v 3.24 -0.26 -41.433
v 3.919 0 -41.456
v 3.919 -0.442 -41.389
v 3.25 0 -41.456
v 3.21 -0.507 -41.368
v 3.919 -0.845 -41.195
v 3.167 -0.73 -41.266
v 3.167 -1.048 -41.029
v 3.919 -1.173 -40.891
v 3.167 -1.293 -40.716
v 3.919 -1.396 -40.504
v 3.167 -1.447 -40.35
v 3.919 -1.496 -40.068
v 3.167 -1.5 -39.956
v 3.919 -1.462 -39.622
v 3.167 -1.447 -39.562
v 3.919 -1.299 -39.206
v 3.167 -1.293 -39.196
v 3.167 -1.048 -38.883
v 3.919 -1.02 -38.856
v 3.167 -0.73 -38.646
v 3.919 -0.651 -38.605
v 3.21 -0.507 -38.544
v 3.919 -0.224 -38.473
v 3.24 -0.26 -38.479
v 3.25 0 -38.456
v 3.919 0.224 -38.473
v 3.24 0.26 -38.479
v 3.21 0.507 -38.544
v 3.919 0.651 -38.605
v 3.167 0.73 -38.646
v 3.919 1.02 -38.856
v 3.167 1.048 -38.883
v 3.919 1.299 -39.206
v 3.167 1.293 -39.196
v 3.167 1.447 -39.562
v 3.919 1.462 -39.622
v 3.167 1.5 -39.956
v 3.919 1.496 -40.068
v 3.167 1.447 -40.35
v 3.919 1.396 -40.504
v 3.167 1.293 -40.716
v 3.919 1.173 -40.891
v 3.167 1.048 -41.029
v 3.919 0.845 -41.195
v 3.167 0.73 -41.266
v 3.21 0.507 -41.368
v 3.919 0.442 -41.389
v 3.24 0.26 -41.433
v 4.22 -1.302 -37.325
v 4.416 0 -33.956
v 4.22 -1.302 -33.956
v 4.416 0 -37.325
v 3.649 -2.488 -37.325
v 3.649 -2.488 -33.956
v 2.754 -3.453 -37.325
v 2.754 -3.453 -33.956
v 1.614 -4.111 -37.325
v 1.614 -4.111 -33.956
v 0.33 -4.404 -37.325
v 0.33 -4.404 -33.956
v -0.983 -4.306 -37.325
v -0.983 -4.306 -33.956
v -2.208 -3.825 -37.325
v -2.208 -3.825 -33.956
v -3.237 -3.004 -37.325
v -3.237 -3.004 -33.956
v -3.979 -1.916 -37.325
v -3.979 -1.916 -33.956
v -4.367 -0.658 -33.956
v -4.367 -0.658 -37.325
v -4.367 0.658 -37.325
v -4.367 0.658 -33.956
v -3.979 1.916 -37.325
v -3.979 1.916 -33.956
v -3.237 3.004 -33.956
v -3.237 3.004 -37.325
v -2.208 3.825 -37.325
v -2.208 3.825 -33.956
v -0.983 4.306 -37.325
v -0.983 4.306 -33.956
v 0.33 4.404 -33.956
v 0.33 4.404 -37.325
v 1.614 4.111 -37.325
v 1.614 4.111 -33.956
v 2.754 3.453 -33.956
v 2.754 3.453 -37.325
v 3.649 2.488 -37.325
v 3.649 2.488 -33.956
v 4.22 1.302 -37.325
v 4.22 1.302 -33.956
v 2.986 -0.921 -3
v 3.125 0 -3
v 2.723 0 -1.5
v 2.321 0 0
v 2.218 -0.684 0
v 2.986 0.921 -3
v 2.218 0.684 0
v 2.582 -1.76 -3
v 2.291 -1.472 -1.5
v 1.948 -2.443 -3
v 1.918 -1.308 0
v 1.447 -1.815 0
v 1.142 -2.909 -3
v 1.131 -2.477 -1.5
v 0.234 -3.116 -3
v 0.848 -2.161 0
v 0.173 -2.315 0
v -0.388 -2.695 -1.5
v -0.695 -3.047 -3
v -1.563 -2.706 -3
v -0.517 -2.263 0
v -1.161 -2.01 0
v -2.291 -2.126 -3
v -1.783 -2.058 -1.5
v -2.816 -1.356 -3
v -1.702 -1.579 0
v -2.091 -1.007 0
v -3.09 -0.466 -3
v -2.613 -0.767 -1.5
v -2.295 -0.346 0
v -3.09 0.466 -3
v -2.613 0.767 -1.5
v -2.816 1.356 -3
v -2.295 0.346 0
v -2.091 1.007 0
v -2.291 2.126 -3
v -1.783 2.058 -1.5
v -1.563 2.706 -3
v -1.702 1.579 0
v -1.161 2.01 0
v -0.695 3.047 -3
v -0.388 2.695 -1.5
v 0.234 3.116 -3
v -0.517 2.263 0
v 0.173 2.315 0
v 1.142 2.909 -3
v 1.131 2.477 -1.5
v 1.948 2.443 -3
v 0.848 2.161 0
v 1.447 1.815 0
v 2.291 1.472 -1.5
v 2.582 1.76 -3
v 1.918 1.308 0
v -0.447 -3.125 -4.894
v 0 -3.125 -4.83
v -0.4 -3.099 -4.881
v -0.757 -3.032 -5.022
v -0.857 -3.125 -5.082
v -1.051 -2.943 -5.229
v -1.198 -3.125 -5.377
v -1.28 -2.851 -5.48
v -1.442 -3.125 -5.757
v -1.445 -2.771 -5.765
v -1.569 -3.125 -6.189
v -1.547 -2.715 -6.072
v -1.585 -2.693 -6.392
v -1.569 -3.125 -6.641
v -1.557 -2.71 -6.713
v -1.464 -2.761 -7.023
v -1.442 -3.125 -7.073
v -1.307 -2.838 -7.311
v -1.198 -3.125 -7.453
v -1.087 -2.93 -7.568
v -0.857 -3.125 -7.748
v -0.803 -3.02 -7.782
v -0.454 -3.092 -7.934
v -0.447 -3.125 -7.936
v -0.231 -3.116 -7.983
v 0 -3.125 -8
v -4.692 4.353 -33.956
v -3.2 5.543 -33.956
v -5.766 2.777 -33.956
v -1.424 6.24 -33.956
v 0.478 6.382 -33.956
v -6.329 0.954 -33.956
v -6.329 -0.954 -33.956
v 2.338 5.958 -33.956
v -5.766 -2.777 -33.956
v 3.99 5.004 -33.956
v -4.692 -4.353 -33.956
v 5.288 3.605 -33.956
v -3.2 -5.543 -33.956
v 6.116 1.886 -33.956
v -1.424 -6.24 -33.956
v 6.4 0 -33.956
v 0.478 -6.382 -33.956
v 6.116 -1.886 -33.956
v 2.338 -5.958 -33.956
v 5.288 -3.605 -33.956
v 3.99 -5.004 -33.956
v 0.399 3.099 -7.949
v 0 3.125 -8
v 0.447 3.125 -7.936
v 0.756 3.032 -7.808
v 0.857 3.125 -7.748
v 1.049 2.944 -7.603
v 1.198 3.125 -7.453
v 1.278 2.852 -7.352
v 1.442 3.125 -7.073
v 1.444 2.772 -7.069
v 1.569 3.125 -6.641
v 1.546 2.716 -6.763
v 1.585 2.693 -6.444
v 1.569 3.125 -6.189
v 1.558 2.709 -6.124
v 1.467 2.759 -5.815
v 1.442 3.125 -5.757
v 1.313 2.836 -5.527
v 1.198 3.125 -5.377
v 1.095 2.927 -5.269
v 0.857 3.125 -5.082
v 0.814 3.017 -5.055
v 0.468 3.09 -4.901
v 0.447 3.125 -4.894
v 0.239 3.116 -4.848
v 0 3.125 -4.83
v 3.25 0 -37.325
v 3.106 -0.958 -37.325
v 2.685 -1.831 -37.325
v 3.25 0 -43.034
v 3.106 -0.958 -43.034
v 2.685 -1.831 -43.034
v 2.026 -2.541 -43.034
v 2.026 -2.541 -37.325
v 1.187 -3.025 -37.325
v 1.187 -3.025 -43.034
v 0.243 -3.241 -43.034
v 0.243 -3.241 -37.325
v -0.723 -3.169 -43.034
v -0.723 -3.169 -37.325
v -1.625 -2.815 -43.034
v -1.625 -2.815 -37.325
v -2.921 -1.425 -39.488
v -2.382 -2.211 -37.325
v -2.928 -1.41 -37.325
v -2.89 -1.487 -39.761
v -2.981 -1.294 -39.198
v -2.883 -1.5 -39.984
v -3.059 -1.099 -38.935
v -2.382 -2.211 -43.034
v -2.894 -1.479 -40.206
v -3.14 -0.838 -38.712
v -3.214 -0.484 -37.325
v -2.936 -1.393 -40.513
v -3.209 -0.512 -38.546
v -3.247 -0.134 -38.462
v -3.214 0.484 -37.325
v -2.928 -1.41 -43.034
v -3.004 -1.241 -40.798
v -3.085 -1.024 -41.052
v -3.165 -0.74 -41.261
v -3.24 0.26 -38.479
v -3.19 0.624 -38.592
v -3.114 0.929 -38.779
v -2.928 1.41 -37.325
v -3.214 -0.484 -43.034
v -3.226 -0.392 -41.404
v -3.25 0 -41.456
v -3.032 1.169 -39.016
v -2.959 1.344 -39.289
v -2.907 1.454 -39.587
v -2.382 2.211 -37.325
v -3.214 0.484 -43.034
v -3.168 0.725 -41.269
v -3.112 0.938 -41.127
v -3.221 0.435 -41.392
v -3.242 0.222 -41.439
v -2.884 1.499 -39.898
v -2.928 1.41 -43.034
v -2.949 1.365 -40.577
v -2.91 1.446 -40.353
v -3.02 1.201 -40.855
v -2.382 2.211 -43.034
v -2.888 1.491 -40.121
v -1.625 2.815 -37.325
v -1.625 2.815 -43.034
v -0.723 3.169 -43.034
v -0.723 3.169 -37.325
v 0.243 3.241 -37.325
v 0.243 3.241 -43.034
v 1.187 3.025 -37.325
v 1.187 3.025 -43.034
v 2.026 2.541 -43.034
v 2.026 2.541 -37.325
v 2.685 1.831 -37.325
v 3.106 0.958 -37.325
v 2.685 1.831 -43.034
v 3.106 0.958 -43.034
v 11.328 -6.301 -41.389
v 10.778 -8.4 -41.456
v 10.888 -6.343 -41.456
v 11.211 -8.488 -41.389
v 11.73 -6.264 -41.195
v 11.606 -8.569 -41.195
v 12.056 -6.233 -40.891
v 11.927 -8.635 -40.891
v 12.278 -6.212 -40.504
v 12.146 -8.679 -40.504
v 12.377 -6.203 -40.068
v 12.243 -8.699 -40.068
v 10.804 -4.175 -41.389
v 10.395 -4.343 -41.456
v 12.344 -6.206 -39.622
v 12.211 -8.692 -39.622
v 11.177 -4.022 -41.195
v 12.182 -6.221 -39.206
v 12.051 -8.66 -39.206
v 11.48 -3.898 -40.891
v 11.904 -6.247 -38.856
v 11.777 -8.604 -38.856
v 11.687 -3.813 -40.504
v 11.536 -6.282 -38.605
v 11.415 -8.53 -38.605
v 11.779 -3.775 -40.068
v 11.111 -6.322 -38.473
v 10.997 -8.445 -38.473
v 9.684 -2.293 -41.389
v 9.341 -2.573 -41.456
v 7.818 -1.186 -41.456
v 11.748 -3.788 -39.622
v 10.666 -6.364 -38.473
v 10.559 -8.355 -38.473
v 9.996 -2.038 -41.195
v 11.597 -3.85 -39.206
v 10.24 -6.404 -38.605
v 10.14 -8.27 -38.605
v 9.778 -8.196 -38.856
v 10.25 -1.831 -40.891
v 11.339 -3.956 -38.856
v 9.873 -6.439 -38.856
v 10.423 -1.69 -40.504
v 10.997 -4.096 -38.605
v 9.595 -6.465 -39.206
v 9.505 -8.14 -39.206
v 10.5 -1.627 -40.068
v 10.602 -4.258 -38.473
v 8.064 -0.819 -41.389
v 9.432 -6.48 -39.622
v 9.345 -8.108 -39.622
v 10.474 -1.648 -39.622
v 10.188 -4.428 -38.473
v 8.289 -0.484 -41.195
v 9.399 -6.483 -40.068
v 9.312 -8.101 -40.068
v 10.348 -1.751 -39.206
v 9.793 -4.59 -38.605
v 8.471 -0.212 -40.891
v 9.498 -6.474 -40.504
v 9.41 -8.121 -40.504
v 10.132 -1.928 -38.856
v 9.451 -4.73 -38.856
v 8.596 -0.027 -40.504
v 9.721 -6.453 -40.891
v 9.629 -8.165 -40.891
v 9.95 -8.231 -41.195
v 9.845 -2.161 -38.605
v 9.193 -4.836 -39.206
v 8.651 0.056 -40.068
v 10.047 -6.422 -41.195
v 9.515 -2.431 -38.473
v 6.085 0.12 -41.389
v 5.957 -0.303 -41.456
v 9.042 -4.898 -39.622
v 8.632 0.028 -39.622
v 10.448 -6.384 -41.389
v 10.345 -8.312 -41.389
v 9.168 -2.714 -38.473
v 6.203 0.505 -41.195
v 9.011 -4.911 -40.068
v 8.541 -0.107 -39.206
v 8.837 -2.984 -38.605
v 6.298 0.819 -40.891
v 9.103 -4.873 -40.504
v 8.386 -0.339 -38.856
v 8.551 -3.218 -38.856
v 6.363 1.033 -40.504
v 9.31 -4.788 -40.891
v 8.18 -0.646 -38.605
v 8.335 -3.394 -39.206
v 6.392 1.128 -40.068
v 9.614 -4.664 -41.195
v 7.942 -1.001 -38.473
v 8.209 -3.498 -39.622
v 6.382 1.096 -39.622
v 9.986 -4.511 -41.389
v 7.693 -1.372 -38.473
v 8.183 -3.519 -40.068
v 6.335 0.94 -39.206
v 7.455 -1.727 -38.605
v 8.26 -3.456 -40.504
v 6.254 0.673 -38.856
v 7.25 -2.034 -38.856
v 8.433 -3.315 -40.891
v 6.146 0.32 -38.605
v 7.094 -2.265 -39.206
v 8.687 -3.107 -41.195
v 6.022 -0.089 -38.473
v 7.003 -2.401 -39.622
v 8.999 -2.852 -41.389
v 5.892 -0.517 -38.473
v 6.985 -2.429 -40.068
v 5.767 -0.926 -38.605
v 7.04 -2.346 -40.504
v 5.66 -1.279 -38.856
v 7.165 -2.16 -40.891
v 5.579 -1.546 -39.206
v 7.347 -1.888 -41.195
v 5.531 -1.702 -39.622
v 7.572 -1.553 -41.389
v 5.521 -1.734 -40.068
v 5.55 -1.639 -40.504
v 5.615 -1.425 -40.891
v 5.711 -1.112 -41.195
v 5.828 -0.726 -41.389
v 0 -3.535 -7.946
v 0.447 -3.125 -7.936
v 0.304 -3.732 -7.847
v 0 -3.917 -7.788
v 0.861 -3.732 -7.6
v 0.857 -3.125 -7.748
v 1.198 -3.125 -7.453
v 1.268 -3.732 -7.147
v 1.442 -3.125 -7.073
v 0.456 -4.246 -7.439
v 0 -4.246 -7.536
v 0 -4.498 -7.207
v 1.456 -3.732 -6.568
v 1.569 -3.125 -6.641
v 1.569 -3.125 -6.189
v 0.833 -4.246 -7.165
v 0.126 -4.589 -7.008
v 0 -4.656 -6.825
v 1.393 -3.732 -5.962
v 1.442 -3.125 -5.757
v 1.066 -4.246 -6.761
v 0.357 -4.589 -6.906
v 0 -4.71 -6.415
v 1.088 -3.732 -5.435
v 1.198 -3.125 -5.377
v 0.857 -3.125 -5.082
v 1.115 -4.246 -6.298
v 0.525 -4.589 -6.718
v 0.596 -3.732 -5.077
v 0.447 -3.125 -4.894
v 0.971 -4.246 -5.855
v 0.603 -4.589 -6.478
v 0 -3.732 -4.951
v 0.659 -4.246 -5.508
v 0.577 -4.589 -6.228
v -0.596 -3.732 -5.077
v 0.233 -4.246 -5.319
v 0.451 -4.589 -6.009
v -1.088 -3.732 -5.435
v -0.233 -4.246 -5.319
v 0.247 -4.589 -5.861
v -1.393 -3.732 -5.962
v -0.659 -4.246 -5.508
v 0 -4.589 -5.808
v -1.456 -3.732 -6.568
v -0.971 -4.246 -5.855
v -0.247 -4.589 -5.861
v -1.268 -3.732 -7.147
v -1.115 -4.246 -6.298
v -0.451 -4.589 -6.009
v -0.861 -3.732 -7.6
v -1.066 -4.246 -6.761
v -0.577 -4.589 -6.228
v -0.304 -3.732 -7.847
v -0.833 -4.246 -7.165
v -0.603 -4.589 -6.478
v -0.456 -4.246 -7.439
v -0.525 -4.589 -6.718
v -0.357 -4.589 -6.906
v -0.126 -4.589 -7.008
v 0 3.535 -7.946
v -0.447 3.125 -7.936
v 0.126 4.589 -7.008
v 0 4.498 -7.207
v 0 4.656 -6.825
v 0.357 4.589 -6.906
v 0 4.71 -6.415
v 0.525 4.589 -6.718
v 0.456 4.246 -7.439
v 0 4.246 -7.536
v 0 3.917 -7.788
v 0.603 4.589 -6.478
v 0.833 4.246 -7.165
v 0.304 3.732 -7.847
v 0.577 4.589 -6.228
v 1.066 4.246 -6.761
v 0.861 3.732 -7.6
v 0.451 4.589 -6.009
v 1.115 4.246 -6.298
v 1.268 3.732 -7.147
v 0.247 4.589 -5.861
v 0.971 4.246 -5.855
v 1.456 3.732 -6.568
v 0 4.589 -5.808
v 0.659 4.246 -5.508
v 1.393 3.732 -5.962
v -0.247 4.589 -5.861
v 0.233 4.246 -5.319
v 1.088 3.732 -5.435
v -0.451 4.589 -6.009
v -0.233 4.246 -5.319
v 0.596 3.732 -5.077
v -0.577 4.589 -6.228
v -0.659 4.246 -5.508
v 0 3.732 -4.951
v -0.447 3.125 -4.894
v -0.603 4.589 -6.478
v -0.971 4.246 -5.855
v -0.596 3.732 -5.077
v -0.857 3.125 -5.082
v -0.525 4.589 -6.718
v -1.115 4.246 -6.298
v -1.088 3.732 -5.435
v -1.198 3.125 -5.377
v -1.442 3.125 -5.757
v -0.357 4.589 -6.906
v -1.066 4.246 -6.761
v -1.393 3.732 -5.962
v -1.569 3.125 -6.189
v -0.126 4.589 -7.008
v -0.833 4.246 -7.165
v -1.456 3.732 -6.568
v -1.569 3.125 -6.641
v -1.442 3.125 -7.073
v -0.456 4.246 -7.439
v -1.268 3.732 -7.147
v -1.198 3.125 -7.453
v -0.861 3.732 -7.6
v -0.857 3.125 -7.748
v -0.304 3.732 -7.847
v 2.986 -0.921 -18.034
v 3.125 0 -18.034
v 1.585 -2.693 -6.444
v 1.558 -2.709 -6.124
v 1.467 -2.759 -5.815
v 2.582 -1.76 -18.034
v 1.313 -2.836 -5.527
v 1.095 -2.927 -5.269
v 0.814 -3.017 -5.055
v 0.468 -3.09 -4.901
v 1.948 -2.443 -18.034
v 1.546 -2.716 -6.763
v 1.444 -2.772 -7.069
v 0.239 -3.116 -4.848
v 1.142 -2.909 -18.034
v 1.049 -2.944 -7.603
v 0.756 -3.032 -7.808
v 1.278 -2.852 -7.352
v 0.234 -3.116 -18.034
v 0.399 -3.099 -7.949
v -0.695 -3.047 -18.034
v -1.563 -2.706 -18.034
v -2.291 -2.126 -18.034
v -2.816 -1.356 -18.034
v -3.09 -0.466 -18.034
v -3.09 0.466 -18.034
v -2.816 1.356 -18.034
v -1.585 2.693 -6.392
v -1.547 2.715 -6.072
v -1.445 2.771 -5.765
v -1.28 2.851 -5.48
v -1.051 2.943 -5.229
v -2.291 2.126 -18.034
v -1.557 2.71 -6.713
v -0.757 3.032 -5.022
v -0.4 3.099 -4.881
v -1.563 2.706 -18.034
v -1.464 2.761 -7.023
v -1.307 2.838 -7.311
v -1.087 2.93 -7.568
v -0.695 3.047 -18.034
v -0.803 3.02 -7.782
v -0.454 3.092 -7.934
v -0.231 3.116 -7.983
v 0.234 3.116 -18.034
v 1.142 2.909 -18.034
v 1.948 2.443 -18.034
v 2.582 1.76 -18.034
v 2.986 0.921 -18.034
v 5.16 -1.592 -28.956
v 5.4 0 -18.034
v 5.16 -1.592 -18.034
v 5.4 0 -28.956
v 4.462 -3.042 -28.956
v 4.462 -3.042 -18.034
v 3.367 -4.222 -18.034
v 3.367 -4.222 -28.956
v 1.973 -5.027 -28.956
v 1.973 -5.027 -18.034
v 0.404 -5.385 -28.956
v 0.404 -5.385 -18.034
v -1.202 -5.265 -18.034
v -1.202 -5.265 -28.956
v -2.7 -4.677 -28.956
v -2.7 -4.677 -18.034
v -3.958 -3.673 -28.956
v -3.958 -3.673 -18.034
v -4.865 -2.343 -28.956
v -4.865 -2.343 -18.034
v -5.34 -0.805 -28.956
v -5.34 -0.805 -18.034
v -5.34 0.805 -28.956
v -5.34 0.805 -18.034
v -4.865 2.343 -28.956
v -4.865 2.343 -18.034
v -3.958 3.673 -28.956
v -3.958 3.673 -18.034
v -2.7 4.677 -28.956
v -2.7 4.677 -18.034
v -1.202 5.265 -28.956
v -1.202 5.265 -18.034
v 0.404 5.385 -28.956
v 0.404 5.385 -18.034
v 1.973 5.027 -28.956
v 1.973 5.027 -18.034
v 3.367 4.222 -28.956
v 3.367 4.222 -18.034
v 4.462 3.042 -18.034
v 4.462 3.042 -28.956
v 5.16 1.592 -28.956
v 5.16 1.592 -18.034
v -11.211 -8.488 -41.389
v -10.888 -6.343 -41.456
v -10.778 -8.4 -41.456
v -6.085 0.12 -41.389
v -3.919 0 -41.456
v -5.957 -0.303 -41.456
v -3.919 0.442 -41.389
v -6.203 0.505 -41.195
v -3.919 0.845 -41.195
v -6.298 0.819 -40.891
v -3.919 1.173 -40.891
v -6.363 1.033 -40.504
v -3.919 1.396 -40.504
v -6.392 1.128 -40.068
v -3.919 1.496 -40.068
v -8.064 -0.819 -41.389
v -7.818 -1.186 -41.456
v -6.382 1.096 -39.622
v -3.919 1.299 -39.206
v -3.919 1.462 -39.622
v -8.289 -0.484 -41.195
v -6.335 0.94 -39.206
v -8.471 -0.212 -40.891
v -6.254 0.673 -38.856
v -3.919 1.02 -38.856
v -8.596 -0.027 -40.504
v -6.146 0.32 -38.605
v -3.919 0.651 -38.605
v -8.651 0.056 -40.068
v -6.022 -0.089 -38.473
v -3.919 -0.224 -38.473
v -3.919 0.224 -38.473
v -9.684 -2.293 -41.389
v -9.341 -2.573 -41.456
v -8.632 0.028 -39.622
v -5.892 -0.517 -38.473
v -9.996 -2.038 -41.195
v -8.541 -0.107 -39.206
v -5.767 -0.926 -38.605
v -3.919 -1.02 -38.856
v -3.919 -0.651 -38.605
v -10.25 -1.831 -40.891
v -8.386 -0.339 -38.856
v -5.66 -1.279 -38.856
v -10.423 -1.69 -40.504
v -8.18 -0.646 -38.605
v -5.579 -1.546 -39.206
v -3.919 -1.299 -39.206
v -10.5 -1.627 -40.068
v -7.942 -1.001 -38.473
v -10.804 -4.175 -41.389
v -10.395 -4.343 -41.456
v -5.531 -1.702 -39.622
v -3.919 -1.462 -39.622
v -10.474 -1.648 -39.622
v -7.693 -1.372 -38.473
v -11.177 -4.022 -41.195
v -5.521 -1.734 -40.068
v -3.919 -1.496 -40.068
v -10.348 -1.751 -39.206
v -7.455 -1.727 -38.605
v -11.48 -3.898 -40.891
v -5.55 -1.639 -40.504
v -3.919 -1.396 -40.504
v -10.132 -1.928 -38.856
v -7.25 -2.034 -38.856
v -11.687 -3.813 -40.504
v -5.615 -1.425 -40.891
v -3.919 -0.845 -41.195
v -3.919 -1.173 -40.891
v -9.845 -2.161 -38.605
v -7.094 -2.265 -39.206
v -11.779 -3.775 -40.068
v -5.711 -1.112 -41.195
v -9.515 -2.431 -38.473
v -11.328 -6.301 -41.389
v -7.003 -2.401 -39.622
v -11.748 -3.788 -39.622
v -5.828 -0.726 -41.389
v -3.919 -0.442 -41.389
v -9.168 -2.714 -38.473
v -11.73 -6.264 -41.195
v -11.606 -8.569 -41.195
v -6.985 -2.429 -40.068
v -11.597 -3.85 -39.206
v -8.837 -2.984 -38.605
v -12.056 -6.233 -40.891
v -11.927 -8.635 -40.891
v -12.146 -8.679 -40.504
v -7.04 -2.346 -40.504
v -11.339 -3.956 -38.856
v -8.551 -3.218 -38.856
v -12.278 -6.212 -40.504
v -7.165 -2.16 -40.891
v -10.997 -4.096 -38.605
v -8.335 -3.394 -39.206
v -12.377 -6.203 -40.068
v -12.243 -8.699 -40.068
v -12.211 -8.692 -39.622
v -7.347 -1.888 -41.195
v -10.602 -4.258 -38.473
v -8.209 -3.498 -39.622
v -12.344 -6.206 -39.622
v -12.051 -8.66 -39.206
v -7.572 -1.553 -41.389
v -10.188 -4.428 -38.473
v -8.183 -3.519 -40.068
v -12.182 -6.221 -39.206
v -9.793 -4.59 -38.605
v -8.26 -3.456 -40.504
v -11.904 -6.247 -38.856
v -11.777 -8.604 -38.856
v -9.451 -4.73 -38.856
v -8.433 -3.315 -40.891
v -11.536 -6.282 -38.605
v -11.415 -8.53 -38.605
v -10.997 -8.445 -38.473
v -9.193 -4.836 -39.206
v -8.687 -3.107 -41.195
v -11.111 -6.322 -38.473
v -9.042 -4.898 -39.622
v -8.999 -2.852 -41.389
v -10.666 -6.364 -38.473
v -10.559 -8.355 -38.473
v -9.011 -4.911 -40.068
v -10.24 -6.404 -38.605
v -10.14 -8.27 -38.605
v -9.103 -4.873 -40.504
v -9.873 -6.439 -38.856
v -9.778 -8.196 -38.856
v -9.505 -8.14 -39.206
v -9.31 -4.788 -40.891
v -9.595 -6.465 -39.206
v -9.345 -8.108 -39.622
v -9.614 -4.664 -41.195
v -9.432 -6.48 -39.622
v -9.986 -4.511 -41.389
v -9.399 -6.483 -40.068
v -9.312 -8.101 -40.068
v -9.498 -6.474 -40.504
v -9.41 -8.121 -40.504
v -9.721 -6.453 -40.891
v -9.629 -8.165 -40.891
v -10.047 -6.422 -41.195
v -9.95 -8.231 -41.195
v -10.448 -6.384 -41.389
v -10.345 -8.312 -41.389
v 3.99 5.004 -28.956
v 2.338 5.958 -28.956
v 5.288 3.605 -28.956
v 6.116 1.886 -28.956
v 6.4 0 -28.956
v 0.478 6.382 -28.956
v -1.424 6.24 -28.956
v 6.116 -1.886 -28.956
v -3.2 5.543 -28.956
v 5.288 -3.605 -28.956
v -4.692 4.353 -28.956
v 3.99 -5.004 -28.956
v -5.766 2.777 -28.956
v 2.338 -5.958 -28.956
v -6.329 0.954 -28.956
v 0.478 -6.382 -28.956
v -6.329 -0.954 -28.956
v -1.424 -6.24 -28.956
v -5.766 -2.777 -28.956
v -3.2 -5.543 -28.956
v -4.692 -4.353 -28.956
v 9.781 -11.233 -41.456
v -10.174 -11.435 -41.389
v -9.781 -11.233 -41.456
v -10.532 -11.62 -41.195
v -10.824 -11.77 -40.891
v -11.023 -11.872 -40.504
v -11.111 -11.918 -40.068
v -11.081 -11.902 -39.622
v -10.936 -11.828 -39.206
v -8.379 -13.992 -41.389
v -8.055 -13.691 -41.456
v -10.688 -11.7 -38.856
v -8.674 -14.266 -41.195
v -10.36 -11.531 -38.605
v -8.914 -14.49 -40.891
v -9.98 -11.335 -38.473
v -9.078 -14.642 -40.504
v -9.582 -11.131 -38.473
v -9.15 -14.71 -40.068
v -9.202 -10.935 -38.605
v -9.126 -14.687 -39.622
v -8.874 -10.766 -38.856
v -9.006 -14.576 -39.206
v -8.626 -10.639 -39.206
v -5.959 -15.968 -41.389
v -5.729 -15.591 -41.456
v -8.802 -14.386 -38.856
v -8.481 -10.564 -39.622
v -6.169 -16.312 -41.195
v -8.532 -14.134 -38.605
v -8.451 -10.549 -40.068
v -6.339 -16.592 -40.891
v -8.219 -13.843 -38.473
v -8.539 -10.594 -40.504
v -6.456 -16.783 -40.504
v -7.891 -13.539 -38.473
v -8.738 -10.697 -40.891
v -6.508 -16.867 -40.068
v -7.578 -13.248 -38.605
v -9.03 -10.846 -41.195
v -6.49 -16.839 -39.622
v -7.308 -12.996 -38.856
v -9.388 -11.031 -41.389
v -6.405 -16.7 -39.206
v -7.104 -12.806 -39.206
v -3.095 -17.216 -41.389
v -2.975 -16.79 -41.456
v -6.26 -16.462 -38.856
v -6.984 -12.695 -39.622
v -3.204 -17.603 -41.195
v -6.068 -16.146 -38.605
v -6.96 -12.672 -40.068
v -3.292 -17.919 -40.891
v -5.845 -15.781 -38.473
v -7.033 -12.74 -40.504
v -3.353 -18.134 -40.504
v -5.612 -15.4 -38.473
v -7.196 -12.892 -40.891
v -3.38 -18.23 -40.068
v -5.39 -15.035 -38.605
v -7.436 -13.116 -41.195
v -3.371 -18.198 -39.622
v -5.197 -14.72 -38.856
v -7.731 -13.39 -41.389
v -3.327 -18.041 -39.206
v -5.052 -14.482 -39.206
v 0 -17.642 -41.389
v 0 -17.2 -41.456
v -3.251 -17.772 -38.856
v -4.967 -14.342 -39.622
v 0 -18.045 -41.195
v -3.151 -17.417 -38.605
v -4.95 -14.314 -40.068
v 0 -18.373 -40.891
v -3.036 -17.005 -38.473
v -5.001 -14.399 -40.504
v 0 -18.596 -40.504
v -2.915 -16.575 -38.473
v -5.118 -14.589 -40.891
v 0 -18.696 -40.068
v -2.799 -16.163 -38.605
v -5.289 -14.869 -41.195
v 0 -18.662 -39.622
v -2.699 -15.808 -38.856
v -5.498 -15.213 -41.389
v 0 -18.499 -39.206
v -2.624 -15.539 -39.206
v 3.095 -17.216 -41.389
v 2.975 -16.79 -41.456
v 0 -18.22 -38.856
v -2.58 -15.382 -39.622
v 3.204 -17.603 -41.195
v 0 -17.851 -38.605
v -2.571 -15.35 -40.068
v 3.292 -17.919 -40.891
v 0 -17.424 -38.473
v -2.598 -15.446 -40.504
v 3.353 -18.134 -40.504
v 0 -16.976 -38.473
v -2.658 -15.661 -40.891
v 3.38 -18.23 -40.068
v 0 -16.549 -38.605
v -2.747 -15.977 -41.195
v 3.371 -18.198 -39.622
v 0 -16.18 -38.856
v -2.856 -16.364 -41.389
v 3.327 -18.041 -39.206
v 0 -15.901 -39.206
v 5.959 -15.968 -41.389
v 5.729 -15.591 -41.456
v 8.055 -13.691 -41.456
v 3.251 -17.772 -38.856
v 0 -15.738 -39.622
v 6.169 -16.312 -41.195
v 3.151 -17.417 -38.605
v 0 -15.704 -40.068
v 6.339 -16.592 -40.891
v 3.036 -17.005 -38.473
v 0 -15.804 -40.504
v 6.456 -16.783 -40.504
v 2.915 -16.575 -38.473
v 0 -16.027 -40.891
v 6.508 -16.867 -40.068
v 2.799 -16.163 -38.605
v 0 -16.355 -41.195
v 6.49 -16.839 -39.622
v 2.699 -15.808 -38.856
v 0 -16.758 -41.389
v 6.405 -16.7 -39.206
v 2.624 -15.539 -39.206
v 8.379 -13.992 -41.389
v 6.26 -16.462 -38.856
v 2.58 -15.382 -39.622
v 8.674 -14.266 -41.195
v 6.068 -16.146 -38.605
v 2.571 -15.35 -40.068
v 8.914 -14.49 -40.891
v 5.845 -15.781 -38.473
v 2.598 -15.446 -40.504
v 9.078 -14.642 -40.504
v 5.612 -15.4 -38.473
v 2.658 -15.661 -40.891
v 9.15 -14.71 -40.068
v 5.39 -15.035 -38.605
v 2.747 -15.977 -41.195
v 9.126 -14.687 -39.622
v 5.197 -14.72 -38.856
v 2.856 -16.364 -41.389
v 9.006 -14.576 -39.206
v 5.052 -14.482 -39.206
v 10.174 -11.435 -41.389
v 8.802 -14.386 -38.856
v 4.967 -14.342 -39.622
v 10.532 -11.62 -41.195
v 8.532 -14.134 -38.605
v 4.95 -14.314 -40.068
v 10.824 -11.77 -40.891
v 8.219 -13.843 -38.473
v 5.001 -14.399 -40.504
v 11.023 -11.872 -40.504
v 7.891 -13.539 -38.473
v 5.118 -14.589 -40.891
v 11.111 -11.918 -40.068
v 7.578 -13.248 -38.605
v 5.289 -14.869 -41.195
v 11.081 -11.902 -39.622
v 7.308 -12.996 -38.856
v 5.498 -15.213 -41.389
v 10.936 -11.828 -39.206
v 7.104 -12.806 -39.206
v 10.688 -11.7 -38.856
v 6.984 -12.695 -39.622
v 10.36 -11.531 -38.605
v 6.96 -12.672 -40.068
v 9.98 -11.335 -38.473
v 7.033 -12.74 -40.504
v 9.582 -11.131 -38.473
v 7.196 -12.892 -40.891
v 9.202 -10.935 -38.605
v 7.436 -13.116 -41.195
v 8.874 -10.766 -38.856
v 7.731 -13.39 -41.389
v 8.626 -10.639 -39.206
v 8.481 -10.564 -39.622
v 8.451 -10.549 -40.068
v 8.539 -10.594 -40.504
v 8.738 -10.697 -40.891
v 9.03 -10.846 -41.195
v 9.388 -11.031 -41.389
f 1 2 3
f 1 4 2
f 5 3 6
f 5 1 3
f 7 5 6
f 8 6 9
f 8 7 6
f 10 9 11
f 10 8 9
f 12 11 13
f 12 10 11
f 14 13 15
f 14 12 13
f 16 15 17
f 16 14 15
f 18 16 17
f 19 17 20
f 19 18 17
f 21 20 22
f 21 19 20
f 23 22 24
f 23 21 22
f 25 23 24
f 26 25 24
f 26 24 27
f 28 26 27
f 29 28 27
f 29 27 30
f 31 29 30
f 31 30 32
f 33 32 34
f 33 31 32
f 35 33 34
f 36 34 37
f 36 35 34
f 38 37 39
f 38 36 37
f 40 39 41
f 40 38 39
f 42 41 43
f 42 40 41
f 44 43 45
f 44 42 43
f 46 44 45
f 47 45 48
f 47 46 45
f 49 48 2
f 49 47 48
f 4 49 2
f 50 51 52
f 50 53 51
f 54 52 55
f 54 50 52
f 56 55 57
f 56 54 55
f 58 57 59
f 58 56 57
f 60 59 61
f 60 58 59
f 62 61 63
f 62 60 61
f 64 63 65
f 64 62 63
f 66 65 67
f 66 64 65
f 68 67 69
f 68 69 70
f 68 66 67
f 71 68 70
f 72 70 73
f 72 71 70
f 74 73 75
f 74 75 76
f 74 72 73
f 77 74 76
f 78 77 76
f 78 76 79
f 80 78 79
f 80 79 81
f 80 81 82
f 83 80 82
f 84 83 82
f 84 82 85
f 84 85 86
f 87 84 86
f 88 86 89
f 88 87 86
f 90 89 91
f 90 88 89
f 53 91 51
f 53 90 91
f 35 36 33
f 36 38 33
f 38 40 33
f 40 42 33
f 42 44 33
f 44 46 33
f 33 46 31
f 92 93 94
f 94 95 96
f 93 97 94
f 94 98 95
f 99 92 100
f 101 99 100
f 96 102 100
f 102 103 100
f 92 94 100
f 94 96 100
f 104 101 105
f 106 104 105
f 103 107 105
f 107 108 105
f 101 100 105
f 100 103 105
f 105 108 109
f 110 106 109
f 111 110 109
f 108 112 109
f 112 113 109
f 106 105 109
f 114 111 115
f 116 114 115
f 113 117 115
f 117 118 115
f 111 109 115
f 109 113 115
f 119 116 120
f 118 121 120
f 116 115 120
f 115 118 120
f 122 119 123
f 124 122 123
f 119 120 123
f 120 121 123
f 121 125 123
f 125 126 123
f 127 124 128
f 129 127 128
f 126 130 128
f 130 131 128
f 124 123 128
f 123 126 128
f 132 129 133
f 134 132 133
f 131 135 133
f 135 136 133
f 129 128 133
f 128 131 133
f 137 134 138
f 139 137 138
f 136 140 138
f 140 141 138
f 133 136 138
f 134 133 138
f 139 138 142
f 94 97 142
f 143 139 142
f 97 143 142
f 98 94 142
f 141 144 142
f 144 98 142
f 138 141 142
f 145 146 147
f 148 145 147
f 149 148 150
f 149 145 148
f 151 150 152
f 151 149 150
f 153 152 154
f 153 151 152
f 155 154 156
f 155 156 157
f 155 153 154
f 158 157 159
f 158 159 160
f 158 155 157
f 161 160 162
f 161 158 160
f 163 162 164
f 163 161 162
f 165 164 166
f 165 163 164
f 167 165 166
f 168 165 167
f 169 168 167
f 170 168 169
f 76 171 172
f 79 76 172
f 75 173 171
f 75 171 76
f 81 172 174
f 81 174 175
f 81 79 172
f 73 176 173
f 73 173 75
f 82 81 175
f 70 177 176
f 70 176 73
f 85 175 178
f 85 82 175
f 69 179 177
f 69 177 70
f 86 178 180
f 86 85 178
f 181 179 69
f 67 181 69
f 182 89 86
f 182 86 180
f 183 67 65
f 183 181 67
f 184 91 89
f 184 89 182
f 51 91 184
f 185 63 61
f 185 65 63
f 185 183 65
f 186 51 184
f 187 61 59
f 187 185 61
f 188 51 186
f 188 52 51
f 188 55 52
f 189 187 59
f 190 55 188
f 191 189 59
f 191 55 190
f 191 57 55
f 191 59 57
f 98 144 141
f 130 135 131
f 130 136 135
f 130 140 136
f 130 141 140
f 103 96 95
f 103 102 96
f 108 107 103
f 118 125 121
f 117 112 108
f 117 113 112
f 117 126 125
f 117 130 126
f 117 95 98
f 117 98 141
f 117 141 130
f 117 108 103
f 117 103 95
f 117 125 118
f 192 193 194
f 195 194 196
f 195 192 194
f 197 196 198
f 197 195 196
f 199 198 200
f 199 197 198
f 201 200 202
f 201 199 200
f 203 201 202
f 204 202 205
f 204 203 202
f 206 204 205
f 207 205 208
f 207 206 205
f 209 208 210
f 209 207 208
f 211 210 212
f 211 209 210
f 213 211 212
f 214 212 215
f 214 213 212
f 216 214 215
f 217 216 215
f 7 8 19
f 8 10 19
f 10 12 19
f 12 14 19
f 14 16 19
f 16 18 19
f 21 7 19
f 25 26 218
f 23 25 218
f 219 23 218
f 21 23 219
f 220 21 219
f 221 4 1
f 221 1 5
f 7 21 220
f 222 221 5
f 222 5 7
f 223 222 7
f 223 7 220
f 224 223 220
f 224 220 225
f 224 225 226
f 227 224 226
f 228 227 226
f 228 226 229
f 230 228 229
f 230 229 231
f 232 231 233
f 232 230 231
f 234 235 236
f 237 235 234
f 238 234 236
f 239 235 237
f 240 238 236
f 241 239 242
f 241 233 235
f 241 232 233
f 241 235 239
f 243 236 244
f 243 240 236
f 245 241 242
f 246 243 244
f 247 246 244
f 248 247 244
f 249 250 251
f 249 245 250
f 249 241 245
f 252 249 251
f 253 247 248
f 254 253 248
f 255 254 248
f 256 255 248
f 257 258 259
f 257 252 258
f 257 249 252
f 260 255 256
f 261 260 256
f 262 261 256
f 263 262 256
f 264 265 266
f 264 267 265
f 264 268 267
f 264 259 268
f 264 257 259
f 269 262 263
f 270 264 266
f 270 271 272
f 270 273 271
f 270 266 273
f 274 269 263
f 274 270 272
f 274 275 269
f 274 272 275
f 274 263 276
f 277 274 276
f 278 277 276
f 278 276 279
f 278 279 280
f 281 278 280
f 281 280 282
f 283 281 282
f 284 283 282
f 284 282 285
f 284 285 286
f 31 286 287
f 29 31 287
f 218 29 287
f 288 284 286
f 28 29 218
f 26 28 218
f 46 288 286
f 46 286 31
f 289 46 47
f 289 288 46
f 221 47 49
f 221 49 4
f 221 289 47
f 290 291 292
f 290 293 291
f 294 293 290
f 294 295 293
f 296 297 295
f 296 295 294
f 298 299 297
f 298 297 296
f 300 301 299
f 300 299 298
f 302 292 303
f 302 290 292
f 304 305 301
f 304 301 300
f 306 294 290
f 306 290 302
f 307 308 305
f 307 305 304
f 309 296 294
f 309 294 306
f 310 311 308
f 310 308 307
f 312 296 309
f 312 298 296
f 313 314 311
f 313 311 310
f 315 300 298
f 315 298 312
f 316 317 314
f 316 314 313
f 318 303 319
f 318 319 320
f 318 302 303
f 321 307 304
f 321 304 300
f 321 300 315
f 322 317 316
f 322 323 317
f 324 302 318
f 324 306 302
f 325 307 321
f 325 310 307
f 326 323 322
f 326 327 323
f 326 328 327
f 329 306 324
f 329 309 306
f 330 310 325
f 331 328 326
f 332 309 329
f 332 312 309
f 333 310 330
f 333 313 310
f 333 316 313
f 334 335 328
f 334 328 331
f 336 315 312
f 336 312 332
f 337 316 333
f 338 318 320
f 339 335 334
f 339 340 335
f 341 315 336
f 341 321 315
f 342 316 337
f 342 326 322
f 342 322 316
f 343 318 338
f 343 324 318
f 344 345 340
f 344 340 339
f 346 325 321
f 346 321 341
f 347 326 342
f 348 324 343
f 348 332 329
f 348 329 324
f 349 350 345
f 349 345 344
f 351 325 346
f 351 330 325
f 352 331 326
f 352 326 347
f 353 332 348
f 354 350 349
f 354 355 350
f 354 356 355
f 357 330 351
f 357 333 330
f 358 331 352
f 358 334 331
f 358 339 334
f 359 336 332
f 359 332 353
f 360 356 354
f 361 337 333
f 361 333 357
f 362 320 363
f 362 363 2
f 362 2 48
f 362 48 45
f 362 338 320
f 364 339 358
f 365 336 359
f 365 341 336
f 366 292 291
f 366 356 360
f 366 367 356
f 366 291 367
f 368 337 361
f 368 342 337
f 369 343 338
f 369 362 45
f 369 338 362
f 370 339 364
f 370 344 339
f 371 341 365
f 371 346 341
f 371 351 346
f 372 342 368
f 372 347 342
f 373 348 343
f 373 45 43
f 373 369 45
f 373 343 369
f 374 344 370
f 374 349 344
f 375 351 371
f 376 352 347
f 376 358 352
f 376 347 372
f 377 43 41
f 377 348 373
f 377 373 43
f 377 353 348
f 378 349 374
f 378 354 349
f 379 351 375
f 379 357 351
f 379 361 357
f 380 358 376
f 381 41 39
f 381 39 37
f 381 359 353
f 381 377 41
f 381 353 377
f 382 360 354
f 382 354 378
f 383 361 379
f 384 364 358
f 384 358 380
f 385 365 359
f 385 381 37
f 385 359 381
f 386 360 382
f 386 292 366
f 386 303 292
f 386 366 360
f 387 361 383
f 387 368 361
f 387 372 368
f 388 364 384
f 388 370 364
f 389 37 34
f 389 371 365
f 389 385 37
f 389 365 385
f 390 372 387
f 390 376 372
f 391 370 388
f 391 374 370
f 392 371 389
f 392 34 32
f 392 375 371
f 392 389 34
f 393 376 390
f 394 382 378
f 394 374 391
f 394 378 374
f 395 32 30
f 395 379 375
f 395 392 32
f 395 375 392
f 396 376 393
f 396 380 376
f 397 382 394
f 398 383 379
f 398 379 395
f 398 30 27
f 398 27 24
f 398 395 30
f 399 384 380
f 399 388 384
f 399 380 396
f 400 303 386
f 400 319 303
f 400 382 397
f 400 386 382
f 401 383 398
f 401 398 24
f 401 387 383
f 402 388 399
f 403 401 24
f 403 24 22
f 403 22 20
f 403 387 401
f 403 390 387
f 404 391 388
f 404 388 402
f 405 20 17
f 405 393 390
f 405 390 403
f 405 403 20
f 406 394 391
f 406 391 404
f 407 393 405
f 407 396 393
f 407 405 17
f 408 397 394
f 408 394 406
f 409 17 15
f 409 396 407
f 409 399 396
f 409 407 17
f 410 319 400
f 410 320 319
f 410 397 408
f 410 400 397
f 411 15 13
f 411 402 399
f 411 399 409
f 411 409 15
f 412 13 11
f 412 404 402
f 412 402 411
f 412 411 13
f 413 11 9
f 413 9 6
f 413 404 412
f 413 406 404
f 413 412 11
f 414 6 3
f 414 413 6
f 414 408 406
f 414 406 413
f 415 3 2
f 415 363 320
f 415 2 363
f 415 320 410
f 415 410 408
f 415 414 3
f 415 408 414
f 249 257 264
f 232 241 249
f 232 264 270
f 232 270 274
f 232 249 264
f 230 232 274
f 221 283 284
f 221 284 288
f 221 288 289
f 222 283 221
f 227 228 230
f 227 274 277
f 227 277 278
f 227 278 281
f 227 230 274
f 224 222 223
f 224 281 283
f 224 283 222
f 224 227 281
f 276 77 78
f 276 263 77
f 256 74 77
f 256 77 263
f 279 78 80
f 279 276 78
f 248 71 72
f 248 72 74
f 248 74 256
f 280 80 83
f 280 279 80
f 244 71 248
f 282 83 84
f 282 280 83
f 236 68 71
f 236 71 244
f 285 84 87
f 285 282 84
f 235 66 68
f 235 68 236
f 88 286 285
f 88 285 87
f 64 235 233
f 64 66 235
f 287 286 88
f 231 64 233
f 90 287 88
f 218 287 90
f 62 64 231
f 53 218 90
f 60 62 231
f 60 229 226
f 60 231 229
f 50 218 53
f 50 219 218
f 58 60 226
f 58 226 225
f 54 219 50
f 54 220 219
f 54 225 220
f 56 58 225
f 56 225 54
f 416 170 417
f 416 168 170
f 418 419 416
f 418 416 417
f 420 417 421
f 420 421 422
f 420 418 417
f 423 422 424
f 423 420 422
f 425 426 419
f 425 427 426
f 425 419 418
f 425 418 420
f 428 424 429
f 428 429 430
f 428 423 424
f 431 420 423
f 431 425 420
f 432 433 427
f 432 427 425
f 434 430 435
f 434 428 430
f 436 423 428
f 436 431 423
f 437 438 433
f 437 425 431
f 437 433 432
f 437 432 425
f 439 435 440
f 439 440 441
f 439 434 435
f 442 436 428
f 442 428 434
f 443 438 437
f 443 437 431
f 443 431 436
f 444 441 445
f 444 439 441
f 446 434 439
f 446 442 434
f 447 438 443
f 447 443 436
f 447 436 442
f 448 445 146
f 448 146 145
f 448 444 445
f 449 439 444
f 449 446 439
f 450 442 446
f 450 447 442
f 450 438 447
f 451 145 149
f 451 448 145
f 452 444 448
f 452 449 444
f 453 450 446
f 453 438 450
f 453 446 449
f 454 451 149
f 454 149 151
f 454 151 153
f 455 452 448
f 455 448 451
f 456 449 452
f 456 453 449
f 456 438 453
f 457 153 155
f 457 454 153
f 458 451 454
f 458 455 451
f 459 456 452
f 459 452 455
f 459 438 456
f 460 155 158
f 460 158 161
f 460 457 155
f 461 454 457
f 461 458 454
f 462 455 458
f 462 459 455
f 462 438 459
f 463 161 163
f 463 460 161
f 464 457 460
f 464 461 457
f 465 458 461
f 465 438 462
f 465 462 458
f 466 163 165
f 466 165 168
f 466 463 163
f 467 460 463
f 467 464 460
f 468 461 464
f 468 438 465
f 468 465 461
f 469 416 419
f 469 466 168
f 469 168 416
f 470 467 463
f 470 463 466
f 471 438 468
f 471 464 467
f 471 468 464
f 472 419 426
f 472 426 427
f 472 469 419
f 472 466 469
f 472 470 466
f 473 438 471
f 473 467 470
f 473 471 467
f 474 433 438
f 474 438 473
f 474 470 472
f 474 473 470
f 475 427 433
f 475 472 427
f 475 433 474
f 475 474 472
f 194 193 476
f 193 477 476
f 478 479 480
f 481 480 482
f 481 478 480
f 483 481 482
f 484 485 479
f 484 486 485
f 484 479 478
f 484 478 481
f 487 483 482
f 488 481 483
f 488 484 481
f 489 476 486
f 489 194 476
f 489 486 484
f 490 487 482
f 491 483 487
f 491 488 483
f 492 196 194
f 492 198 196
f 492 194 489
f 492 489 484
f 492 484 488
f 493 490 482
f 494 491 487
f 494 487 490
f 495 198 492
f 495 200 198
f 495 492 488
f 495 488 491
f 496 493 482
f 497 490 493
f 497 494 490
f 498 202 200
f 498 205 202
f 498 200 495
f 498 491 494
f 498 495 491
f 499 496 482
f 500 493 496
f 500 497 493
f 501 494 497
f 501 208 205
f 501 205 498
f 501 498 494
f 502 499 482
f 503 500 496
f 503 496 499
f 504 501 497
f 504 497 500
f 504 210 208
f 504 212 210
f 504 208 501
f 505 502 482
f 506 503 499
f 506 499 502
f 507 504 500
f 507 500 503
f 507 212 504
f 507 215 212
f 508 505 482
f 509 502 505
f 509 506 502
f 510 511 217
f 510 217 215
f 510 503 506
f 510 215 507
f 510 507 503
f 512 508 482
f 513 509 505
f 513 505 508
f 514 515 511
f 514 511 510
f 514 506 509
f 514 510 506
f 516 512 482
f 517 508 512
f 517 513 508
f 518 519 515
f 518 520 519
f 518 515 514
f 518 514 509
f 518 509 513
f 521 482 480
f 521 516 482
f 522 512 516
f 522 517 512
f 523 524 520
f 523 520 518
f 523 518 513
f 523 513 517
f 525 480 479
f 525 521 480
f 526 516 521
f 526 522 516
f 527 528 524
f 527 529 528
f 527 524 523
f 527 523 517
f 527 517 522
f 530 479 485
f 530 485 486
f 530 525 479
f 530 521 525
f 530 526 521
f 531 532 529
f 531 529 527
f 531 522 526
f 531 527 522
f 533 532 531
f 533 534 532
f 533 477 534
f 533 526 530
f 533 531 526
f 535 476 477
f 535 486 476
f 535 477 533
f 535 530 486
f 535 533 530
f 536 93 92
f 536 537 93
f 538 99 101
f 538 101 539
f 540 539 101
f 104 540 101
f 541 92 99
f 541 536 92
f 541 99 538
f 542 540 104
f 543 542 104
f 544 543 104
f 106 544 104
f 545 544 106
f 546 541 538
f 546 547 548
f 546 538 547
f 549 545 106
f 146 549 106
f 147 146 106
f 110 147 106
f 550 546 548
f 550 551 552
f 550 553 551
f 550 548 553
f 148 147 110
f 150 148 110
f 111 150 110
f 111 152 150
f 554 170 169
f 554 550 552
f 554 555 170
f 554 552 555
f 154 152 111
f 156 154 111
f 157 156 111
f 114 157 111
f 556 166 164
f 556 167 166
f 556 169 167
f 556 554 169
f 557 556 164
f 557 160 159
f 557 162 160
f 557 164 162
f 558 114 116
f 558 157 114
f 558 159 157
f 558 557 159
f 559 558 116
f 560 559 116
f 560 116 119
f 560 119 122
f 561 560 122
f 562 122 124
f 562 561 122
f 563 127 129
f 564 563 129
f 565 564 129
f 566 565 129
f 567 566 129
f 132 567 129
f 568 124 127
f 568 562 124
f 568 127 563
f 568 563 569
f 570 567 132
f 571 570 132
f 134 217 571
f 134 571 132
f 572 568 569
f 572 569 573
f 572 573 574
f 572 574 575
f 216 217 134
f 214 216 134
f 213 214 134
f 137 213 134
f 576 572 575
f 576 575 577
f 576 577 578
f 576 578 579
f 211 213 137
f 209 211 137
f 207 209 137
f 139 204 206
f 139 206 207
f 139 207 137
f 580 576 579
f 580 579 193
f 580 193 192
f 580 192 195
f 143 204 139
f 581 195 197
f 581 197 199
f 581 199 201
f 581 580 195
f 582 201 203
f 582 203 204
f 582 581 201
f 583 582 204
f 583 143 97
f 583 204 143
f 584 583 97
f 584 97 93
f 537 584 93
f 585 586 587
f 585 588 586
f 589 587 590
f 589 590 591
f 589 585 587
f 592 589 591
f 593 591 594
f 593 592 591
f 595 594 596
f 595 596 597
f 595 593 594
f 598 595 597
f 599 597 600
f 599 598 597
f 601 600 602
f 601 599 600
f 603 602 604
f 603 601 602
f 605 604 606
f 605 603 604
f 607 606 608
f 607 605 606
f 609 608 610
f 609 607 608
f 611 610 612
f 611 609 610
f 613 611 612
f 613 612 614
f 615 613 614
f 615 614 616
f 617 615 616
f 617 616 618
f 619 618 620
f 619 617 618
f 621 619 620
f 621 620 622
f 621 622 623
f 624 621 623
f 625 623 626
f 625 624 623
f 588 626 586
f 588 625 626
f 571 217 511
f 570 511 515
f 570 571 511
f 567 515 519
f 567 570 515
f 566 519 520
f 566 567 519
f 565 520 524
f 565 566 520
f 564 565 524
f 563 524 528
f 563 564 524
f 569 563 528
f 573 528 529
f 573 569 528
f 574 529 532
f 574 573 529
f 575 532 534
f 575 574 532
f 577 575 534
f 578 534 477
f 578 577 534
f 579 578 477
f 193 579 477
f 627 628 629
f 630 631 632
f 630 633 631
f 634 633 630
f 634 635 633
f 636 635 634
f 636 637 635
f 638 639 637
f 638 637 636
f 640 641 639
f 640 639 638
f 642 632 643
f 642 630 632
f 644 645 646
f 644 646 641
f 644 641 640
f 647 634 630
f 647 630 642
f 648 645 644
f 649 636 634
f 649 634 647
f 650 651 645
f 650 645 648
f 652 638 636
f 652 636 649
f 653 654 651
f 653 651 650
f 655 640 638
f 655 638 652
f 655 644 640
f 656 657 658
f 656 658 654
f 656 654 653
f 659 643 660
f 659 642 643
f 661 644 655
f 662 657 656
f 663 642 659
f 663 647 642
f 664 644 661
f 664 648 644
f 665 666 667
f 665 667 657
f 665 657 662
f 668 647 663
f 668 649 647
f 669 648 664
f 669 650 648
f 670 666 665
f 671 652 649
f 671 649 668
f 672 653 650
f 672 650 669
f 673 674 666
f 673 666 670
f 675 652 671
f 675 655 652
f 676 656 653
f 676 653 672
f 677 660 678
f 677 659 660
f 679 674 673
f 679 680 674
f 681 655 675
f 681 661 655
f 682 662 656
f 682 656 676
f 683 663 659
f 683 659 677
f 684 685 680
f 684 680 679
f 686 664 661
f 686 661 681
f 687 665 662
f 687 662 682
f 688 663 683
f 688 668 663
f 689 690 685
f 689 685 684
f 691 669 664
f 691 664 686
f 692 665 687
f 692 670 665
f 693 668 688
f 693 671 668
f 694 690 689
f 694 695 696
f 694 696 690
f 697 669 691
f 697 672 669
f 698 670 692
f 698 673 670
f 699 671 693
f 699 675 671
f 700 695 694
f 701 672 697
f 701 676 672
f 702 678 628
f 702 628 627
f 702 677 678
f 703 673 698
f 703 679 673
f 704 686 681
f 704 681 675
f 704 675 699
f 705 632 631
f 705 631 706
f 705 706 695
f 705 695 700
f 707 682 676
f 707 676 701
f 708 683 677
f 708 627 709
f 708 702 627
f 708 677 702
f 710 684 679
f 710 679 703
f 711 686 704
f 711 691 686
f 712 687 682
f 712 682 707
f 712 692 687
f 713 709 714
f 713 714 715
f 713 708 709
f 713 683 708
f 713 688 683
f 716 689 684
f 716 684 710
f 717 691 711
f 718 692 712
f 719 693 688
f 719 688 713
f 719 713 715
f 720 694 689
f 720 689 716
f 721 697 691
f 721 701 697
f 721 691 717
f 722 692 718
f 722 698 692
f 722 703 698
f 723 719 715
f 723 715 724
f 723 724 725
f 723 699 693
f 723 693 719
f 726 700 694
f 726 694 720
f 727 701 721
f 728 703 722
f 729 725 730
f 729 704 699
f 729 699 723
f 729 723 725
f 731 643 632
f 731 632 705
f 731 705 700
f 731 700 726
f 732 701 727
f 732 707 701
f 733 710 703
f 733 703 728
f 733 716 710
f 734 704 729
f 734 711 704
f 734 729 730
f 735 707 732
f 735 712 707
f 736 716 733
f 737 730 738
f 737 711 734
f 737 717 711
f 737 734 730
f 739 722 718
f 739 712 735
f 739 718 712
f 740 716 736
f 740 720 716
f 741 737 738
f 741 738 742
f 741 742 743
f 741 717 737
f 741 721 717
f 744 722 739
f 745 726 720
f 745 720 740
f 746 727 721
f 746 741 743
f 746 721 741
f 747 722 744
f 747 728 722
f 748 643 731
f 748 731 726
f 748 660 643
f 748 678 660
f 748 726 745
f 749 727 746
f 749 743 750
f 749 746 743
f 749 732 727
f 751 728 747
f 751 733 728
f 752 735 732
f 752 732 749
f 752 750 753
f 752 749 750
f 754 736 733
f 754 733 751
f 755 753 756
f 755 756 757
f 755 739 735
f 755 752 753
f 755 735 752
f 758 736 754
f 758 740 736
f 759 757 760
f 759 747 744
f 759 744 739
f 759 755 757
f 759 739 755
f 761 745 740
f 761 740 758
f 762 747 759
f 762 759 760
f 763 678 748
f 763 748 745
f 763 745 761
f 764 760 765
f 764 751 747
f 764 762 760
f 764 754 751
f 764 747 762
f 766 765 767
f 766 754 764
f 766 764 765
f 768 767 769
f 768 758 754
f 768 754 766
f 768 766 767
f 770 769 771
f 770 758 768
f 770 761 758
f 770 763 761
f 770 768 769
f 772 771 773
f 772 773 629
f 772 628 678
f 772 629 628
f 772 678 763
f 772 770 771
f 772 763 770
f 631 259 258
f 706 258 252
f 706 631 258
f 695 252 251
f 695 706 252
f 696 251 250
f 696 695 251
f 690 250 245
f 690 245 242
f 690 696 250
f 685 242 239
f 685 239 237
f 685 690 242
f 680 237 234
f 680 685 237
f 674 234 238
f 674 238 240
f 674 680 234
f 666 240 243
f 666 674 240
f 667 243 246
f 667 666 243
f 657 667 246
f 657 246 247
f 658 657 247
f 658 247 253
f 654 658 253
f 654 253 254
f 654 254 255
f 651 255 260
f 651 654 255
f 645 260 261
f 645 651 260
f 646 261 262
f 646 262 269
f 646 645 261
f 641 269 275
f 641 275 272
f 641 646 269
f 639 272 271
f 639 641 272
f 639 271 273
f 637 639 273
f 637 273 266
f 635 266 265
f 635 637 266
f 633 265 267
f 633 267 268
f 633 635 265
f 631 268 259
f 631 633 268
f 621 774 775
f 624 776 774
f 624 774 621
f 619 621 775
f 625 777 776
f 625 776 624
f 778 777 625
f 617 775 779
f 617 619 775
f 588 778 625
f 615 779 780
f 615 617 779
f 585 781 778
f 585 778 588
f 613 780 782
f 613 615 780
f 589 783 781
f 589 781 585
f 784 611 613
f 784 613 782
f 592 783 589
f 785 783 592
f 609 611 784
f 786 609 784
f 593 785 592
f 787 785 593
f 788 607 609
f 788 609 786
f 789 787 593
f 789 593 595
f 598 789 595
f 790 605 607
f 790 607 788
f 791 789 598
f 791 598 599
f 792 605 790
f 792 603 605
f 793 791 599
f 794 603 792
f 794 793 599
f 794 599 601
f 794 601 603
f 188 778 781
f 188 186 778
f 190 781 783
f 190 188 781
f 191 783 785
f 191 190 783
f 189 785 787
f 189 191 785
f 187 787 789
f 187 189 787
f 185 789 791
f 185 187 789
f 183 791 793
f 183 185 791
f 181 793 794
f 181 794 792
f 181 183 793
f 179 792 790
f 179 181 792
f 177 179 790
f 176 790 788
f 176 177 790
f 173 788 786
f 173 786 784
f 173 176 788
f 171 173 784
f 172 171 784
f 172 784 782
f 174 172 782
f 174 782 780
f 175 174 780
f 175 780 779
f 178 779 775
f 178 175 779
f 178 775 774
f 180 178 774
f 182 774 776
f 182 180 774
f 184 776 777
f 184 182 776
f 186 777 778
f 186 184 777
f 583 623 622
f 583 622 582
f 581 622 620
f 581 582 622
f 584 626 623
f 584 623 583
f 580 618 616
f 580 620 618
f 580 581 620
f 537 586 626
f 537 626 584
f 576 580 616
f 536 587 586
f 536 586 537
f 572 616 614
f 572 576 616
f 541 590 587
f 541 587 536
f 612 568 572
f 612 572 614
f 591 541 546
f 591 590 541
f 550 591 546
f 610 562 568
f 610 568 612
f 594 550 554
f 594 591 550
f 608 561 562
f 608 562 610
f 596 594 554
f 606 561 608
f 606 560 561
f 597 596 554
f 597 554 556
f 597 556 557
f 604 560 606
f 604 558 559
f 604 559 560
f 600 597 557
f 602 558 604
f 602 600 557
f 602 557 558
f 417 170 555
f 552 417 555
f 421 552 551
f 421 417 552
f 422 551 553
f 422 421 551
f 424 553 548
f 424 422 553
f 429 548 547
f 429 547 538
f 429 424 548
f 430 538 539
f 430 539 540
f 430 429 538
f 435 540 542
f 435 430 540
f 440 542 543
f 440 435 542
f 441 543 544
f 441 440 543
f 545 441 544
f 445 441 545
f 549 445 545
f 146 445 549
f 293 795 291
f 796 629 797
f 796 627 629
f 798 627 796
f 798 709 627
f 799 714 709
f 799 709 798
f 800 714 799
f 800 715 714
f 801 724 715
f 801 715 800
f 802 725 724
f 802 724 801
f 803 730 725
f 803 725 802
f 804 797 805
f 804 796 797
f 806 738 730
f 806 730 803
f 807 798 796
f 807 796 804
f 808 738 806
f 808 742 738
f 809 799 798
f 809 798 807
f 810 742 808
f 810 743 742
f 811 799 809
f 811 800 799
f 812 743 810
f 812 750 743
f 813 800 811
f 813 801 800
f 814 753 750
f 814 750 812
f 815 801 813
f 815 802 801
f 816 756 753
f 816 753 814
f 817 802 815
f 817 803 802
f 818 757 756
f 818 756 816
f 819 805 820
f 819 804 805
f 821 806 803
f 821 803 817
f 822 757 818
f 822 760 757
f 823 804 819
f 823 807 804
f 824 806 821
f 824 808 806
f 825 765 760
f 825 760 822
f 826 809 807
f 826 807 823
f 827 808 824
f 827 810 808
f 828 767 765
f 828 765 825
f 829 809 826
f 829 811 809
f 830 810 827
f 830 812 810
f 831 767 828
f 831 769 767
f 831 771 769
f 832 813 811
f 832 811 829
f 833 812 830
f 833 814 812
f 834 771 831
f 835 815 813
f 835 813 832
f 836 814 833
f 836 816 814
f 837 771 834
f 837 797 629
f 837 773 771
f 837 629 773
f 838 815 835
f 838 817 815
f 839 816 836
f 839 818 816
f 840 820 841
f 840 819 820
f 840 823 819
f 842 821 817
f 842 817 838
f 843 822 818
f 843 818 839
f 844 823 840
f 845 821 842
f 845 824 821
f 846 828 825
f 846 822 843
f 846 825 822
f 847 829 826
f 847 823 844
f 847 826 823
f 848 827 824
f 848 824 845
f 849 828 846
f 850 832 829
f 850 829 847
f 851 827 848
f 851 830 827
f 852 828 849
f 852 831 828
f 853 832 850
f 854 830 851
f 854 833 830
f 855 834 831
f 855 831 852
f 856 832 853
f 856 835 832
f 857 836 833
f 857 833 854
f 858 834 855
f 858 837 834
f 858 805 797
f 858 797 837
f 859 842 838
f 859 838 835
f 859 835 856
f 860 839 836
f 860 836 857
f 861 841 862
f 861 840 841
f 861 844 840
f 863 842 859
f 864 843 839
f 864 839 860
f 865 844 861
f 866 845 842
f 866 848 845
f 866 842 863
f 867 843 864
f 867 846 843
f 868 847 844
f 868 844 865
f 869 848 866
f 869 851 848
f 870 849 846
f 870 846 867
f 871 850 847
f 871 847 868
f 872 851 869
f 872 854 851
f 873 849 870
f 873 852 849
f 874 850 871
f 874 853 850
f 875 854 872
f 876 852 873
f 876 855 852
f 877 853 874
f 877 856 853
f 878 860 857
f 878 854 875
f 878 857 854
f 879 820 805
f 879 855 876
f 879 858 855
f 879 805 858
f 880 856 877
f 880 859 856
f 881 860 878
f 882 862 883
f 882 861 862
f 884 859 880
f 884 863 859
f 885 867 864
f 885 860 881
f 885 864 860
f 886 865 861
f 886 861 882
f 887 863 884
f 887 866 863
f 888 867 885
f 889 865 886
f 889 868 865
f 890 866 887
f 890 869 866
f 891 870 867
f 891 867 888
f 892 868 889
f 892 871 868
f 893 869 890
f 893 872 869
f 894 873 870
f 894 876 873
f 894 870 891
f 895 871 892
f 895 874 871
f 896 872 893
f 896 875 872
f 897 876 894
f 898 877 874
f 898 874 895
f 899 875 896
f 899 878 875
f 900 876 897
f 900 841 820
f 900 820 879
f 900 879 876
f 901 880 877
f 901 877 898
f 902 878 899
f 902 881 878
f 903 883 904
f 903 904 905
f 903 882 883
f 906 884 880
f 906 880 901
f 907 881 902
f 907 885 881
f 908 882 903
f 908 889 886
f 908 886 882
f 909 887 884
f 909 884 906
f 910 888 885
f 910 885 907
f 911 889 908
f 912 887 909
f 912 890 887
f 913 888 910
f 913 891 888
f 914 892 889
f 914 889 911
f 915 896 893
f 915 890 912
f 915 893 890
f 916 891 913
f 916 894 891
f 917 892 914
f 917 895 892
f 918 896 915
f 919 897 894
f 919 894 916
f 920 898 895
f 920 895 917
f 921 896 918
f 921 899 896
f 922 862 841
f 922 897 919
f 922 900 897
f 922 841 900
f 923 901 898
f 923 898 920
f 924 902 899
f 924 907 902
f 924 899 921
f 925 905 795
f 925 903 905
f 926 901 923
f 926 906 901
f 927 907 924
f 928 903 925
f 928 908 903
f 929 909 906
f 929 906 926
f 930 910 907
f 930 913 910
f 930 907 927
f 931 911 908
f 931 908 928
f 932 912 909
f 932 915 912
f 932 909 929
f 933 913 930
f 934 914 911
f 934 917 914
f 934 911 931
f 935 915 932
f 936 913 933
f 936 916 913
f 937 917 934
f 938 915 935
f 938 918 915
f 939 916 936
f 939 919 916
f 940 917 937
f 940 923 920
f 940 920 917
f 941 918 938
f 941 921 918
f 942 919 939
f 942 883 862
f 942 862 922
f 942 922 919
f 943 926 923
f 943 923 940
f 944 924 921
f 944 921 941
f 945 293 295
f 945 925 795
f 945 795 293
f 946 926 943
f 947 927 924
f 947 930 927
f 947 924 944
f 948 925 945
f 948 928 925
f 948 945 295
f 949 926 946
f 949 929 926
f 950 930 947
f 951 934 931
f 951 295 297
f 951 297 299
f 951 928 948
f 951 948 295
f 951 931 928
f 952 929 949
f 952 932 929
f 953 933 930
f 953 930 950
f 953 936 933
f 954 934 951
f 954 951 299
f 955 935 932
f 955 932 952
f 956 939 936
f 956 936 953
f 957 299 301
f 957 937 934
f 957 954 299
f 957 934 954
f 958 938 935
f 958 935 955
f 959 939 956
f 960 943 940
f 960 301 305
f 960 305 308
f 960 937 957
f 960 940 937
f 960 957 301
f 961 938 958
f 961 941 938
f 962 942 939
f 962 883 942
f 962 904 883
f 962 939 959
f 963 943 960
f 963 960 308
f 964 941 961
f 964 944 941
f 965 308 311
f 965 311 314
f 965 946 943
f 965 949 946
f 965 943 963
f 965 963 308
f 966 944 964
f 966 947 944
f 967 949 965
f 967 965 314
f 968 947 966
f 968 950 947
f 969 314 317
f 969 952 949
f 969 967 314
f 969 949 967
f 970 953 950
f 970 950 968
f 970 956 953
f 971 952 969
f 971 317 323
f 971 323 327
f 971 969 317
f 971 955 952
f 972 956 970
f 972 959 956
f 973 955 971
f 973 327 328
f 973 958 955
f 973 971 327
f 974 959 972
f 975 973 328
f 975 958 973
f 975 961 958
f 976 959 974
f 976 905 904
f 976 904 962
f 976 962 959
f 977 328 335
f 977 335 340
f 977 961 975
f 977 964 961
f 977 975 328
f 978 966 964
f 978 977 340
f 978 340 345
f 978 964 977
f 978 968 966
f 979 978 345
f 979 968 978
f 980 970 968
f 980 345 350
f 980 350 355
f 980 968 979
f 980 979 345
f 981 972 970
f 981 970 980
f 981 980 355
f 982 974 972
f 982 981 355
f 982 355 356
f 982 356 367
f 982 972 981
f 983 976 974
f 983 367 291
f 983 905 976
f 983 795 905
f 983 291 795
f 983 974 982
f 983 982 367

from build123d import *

# Parameters (mm, degrees)
CHAMFER1_SIZE  = 3
CHAMFER1_SIZE2 = 0.803847577
SKETCH4_R      = 1.5


with BuildPart() as part:
    # Sketch1 → Revolve1 (revolve)
    with BuildSketch(Plane(origin=(0, 0, 0), x_dir=(0, 0, -1), z_dir=(1, 0, 0)), mode=Mode.PRIVATE) as revolve1_sk:
        Polygon((0, 0), (0, 3.125), (18.034, 3.125), (18.034, 5.4), (28.956, 5.4), (28.956, 6.4), (33.956, 6.4), (33.956, 4.416438242), (37.324805723, 4.416438242), (37.324805723, 3.25), (43.034, 3.25), (43.034, 0), align=None)
    revolve(revolve1_sk.sketch.rotate(Axis((0, 0, 6.254285714), (0, 0, -1)), 90), axis=Axis((0, 0, 6.254285714), (0, 0, -1)))

    # Chamfer1
    chamfer1_edges = [part.edges().sort_by_distance(p)[0] for p in [
        (-3.125, 0, 0),
    ]]
    chamfer1_side = [part.faces().sort_by_distance(p)[0] for p in [
        (-3.125, 0, -9.017),
    ]]
    chamfer(chamfer1_edges, length=CHAMFER1_SIZE, length2=CHAMFER1_SIZE2, reference=chamfer1_side[0])

    # Sketch2 → Revolve2 (revolve)
    with BuildSketch(Plane(origin=(0, 0, 0), x_dir=(0, 0, -1), z_dir=(1, 0, 0))):
        with BuildLine():
            Line((8, 3.125), (8, -3.125))
            ThreePointArc((8, -3.125), (7.535764248, -4.245764248), (6.415, -4.71))
            Line((6.415, -4.71), (6.415, 4.71))
            ThreePointArc((6.415, 4.71), (7.535764248, 4.245764248), (8, 3.125))
        make_face()
    revolve(axis=Axis((0, 4.71, -6.415), (0, -1, 0)))

    # Sweep2: sweep along a path in Sketch3
    with BuildLine(Plane(origin=(0, 42, -39.956), x_dir=(1, 0, 0), z_dir=(0, 0, -1))) as sweep2_path:
        Line((0, 42), (-3.919183588, 42))
        ThreePointArc((-3.919183588, 42), (-9.341360273, 44.572811276), (-10.777754868, 50.4))
        ThreePointArc((-10.777754868, 50.4), (0, 59.2), (10.777754868, 50.4))
        ThreePointArc((10.777754868, 50.4), (9.341360273, 44.572811276), (3.919183588, 42))
        Line((3.919183588, 42), (3.166927962, 42))
    # Sketch4 → Sweep2 (sweep)
    with BuildSketch(Plane(origin=(0, 0, 0), x_dir=(0, 0, -1), z_dir=(1, 0, 0))):
        with Locations((39.956, 0)):
            Circle(SKETCH4_R)
    sweep(path=sweep2_path.line)


solid = part.part
